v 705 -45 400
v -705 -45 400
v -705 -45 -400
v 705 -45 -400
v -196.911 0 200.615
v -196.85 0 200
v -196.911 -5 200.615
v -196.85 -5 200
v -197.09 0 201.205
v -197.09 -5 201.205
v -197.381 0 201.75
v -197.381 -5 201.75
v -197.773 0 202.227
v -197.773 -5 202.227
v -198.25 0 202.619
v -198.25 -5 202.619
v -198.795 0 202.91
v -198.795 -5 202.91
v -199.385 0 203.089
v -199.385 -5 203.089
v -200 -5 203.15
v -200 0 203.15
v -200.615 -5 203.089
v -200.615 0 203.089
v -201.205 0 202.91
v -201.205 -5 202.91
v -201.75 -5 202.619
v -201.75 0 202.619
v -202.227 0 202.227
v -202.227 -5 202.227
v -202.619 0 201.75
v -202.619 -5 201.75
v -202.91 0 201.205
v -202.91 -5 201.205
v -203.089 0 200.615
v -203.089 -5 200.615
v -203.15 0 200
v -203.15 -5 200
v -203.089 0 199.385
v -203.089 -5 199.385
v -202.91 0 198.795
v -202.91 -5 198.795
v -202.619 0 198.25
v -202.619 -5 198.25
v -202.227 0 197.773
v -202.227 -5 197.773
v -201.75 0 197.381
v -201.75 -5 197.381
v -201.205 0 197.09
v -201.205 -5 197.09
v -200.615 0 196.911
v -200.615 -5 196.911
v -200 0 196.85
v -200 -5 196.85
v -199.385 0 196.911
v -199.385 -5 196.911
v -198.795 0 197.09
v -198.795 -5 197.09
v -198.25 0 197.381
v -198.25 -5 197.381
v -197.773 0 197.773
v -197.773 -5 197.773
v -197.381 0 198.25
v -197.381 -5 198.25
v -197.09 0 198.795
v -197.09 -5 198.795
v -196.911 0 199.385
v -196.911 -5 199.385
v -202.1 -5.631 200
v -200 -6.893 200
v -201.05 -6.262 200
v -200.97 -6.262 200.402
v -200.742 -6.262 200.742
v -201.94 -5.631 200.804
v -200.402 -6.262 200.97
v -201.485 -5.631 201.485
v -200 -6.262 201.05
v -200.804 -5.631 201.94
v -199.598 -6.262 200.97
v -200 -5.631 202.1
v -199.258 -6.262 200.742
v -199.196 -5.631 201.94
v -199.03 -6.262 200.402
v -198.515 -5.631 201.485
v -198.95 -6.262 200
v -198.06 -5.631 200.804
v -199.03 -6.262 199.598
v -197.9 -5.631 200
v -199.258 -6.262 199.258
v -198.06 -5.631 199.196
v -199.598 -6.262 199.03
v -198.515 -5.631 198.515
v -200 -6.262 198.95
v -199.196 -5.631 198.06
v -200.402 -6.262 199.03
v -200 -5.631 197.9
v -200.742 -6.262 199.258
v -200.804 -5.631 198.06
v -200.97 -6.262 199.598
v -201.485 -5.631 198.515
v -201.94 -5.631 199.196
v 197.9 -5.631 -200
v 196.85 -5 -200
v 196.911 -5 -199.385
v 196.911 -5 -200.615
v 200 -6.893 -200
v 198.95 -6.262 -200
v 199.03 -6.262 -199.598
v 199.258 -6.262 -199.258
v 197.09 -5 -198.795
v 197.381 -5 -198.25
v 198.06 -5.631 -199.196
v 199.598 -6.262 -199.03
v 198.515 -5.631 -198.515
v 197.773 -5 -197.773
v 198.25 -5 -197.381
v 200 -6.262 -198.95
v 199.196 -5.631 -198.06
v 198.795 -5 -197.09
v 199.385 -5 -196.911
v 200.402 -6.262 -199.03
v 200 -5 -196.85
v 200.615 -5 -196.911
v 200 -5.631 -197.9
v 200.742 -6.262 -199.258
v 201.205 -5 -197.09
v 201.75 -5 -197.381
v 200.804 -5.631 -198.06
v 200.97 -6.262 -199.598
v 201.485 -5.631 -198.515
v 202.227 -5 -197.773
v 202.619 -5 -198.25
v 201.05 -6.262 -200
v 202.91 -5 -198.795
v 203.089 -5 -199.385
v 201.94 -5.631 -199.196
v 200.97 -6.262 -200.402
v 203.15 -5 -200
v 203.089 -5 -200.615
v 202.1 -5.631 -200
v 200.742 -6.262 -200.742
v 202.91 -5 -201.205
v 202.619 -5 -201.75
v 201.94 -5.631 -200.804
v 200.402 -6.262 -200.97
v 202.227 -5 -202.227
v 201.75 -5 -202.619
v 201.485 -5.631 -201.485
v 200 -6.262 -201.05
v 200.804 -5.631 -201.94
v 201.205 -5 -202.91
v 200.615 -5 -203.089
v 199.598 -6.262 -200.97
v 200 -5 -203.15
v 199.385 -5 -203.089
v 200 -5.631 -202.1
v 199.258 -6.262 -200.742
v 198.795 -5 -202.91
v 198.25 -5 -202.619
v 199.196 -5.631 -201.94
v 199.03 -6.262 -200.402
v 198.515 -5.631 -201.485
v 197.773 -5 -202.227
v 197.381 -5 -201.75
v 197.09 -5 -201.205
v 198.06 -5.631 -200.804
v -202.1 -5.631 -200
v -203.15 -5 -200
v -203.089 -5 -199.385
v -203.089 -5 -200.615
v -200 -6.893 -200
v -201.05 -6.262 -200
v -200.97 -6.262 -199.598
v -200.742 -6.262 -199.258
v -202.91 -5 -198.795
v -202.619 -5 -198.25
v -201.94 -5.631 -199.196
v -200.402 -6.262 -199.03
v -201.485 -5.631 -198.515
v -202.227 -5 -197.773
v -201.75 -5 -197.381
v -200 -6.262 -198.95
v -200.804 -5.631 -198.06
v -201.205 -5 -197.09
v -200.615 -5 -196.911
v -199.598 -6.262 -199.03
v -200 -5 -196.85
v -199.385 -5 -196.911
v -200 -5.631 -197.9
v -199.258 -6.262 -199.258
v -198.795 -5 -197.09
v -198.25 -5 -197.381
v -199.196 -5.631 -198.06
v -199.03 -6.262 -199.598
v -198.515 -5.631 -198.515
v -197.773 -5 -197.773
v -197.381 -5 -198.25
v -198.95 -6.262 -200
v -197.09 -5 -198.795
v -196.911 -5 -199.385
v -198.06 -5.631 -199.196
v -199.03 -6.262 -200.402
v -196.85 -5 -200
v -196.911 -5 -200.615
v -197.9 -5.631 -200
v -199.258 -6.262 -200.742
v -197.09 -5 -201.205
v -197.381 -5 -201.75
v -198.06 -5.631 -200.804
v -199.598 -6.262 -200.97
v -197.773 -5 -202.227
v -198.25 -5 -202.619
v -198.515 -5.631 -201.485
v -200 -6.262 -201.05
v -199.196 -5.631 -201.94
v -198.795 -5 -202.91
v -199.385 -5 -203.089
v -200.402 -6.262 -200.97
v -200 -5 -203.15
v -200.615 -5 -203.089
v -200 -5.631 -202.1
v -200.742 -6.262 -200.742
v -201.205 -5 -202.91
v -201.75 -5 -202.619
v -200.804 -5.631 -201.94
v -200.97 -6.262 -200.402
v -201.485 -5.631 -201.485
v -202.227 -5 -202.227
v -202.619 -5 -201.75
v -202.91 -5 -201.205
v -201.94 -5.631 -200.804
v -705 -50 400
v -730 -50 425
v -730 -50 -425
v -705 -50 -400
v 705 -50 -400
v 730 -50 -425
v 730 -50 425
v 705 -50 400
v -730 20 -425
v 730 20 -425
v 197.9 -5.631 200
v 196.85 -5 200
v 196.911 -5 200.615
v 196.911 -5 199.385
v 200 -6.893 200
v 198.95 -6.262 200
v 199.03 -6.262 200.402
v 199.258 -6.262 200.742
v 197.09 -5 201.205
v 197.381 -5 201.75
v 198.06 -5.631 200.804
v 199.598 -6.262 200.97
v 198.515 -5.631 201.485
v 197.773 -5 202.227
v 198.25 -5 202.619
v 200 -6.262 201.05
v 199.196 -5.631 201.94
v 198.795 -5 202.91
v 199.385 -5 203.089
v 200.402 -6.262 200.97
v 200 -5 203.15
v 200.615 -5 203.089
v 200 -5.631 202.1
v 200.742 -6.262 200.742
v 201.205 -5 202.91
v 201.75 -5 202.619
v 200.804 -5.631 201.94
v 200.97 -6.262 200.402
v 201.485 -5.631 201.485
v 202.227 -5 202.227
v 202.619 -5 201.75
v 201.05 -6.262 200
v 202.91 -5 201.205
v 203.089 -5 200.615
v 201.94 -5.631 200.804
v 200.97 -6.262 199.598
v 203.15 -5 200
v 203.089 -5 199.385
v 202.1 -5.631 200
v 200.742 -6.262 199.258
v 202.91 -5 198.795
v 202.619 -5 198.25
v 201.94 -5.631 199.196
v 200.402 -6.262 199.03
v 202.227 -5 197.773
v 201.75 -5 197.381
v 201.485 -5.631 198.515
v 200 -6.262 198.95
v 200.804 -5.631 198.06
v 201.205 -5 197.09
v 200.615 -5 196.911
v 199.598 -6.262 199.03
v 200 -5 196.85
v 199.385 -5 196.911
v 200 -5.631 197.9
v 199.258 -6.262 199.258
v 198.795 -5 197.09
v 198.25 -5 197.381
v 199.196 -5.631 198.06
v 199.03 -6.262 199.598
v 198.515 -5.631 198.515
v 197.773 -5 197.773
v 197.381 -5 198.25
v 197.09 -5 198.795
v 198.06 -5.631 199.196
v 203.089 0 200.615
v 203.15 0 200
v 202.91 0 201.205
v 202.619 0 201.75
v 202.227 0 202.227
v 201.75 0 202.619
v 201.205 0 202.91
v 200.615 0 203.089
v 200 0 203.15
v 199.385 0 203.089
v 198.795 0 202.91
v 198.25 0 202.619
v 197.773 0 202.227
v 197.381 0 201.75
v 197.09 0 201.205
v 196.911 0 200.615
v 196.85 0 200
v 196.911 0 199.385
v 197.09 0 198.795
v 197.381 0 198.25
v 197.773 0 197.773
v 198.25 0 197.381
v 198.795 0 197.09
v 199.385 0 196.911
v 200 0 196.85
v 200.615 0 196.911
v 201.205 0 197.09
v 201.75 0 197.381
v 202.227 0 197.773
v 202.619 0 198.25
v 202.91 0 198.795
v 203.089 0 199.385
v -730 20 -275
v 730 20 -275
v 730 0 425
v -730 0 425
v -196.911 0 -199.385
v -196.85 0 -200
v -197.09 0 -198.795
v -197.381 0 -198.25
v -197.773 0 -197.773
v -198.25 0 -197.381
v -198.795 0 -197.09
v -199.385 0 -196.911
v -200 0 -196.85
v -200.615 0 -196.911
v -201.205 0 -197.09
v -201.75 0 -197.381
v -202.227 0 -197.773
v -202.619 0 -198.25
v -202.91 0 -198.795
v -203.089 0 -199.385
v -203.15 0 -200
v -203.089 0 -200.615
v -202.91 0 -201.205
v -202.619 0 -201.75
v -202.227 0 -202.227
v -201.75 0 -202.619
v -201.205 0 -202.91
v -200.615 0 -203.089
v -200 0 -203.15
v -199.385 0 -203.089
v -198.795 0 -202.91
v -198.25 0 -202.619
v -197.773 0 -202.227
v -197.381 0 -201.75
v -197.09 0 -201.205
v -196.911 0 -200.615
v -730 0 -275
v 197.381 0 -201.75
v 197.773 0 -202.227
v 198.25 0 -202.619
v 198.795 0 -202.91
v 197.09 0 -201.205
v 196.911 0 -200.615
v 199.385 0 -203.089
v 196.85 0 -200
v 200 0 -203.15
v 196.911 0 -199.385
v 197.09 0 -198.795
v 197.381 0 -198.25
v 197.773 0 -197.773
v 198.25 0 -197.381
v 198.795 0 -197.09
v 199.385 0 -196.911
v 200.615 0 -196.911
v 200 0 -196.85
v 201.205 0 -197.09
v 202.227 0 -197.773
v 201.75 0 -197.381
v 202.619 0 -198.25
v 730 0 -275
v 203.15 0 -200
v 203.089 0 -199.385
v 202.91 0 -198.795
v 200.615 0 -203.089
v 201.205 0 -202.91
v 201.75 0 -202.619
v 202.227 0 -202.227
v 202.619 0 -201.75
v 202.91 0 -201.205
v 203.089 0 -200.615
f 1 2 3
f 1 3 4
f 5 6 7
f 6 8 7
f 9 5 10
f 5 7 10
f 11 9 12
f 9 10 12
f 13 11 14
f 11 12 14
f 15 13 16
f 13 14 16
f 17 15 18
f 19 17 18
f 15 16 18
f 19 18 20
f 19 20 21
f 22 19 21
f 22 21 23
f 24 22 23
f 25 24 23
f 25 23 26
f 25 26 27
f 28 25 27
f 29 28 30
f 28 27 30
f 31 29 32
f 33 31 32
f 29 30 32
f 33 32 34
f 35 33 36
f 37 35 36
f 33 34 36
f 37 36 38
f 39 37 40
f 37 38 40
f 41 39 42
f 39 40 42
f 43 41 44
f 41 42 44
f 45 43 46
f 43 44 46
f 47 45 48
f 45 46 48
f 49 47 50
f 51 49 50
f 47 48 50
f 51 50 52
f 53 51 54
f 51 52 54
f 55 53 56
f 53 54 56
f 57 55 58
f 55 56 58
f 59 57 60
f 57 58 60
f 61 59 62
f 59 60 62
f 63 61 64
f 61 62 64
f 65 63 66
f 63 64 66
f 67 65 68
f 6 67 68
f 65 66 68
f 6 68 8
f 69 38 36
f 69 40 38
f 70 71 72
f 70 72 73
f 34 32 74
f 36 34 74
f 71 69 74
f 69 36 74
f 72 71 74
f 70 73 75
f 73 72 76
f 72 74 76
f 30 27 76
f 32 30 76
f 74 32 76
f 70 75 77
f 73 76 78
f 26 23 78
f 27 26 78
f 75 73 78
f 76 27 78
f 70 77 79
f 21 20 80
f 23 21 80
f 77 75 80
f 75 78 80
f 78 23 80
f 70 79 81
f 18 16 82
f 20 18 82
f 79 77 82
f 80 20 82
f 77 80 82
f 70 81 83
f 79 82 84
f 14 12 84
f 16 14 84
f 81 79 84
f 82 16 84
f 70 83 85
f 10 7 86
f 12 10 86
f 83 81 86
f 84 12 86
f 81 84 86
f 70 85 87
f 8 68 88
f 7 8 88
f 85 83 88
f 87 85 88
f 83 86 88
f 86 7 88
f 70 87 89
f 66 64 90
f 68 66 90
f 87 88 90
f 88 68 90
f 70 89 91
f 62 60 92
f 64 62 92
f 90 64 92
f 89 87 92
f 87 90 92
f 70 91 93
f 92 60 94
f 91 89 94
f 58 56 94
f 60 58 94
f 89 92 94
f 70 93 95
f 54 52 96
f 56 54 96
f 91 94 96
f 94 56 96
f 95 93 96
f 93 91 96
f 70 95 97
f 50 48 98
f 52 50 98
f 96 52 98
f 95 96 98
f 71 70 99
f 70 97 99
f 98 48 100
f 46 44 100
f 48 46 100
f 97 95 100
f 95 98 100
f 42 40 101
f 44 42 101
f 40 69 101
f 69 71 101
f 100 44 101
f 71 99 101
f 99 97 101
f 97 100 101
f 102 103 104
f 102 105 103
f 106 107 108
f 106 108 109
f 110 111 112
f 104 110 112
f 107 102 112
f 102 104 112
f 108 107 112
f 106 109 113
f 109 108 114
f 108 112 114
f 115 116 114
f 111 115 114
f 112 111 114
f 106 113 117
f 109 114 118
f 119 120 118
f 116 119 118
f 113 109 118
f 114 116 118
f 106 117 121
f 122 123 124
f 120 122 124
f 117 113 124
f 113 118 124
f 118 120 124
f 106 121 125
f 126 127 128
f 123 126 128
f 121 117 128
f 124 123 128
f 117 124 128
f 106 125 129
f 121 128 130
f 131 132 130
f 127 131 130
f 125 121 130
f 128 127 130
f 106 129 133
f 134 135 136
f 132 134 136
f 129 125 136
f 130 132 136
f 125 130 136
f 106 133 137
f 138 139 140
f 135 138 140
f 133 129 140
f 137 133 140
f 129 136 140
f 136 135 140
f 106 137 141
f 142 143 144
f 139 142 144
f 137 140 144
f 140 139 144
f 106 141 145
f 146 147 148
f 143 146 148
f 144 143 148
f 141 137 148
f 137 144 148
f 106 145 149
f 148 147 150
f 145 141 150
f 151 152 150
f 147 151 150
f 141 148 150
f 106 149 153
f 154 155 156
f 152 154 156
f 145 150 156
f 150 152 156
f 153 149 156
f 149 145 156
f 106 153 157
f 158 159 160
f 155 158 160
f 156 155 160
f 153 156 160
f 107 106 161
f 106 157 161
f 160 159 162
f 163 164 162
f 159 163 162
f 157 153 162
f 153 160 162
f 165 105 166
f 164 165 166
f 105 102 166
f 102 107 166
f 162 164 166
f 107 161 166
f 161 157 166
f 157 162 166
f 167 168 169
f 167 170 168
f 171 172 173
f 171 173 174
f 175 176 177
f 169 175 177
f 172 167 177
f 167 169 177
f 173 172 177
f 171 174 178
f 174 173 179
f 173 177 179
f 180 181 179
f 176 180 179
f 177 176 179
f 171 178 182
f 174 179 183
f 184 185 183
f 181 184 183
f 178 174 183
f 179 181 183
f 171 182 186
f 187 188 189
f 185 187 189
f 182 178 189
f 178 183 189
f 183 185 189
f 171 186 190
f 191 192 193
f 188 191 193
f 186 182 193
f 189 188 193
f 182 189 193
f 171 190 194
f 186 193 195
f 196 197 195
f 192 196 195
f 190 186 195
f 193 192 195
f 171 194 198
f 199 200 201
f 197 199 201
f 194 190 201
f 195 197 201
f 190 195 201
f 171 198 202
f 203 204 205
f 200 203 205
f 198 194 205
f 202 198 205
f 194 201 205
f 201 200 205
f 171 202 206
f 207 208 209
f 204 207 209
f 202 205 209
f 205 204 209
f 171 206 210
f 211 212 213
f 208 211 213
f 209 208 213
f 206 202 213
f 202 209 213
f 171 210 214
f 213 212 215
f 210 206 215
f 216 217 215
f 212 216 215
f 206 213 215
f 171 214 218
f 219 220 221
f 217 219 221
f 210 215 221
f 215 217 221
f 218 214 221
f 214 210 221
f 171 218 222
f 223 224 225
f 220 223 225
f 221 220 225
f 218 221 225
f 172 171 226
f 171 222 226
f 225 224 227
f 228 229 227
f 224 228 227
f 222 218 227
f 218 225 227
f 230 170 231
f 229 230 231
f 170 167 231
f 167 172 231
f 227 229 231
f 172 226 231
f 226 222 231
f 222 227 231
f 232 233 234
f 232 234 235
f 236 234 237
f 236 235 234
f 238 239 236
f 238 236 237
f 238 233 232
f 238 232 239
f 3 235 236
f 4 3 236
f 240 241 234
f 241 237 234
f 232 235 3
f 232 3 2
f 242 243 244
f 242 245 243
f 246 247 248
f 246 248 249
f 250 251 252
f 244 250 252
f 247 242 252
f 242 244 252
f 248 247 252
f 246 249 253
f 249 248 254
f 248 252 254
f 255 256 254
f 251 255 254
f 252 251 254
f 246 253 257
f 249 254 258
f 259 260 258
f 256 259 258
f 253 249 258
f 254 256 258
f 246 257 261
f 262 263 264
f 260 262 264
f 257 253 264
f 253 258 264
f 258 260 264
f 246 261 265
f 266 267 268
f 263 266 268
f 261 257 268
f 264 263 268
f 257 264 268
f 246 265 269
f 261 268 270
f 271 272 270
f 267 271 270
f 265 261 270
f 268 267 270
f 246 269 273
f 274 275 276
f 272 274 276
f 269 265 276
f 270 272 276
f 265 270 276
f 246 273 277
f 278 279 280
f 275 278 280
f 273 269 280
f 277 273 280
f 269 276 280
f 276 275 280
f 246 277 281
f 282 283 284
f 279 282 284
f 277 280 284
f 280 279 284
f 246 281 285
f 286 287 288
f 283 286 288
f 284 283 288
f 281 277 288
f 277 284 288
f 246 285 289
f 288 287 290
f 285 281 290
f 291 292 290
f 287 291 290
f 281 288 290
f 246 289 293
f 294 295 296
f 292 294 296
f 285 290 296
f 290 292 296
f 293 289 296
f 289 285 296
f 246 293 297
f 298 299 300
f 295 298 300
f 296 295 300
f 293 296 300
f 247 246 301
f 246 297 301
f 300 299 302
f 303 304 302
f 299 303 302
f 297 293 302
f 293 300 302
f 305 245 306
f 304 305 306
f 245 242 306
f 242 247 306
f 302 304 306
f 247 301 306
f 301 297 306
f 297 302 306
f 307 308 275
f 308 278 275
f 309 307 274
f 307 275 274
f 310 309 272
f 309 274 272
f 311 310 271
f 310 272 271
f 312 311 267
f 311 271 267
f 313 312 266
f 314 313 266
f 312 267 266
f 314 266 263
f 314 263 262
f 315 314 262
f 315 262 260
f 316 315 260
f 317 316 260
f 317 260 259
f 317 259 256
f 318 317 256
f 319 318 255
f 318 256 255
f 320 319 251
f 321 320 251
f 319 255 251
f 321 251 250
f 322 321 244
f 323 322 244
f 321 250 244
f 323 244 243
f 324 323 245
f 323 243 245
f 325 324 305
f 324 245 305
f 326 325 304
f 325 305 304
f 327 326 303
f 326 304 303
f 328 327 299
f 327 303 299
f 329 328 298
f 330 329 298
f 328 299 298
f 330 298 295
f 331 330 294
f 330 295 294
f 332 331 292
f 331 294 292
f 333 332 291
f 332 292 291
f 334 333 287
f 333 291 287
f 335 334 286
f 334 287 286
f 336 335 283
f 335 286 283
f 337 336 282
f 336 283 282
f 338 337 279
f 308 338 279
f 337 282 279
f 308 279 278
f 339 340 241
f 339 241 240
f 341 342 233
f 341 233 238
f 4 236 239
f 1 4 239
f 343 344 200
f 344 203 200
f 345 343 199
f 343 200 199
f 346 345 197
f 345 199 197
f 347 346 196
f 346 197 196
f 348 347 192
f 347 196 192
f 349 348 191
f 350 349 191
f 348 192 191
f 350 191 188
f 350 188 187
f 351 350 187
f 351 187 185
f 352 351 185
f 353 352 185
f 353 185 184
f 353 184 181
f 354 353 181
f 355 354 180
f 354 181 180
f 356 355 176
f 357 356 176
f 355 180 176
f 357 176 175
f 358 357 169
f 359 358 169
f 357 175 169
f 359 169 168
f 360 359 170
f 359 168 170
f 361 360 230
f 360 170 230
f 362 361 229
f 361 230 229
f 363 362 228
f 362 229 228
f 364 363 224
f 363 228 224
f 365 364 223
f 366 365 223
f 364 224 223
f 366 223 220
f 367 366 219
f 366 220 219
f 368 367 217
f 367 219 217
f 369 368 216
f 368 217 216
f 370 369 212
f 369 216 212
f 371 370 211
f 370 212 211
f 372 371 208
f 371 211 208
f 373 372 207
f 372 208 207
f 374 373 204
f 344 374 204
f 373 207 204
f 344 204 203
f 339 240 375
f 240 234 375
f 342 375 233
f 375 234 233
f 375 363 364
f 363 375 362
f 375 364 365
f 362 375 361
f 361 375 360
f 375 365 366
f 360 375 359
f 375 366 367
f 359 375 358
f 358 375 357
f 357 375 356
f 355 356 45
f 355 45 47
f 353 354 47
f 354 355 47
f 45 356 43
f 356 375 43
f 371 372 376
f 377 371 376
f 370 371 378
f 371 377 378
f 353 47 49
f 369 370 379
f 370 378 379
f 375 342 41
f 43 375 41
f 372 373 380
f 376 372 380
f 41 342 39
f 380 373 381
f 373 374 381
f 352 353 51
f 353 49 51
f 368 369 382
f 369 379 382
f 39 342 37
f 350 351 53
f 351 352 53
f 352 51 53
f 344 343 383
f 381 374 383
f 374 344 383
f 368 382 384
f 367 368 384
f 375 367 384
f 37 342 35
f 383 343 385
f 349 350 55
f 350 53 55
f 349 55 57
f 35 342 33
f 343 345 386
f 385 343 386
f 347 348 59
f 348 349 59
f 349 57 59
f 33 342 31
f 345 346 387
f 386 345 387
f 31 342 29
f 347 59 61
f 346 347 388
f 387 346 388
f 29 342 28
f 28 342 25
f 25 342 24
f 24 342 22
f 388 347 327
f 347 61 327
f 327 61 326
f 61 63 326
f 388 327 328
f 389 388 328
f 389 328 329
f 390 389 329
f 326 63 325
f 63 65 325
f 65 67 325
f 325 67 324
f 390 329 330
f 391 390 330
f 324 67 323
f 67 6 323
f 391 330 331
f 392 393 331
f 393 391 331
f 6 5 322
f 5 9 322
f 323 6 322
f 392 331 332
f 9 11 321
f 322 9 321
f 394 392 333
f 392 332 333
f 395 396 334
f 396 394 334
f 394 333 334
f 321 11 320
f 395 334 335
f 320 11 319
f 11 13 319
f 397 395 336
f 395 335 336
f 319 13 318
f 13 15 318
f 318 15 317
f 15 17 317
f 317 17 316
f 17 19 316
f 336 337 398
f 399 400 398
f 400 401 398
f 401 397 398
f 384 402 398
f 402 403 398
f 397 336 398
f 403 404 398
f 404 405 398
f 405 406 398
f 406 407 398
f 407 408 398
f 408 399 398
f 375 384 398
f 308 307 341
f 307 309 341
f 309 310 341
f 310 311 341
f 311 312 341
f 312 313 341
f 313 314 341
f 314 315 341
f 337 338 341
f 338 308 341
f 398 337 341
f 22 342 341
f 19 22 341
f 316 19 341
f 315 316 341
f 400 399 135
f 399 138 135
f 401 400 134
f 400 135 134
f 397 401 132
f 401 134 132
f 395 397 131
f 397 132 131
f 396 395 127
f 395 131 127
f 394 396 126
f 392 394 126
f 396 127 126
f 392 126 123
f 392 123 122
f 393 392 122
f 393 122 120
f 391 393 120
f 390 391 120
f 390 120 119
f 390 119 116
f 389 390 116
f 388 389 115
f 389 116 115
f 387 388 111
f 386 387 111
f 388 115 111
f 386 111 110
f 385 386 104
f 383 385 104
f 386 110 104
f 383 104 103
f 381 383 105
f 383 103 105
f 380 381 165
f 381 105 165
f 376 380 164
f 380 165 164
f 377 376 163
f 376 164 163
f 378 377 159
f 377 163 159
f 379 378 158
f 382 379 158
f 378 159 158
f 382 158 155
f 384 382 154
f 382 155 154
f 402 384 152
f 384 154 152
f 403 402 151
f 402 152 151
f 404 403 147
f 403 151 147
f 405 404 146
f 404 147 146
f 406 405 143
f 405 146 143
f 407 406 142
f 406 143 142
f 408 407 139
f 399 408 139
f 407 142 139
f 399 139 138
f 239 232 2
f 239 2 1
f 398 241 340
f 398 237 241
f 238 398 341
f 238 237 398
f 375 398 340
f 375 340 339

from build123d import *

# Parameters (mm, degrees)
F0_W     = 1460
F0_H     = 850
F1_DEPTH = 50
F2_W     = 1410
F2_H     = 800
F3_DEPTH = 5
F5_D     = 6.3
F5_DEPTH = 5
F5_TIP   = 1.8927109499
F4_W     = 1460
F4_H     = 150
F6_DEPTH = 20


with BuildPart() as f1:
    # F0 (on Front) → F1 (new body)
    with BuildSketch(Plane.XZ):
        Rectangle(F0_W, F0_H)
    extrude(amount=F1_DEPTH)

    # F2 (on face) → F3 (cut)
    with BuildSketch(Plane.XZ.offset(50)):
        Rectangle(F2_W, F2_H)
    extrude(amount=-F3_DEPTH, mode=Mode.SUBTRACT)

    # F5
    with Locations(Plane(origin=(0, 0, 0), x_dir=(-1, 0, 0), z_dir=(0, 1, 0))):
        with Locations((-200, 200), (200, 200), (200, -200), (-200, -200)):
            Hole(F5_D / 2, depth=F5_DEPTH)
            with Locations((0, 0, -(F5_DEPTH + F5_TIP / 2))):  # 118° drill point
                Cone(0, F5_D / 2, F5_TIP, mode=Mode.SUBTRACT)

    # F4 (on face) → F6 (join)
    with BuildSketch(Plane(origin=(0, 0, 0), x_dir=(-1, 0, 0), z_dir=(0, 1, 0))):
        with Locations((0, -350)):
            Rectangle(F4_W, F4_H)
    extrude(amount=F6_DEPTH)


solid = f1.part
